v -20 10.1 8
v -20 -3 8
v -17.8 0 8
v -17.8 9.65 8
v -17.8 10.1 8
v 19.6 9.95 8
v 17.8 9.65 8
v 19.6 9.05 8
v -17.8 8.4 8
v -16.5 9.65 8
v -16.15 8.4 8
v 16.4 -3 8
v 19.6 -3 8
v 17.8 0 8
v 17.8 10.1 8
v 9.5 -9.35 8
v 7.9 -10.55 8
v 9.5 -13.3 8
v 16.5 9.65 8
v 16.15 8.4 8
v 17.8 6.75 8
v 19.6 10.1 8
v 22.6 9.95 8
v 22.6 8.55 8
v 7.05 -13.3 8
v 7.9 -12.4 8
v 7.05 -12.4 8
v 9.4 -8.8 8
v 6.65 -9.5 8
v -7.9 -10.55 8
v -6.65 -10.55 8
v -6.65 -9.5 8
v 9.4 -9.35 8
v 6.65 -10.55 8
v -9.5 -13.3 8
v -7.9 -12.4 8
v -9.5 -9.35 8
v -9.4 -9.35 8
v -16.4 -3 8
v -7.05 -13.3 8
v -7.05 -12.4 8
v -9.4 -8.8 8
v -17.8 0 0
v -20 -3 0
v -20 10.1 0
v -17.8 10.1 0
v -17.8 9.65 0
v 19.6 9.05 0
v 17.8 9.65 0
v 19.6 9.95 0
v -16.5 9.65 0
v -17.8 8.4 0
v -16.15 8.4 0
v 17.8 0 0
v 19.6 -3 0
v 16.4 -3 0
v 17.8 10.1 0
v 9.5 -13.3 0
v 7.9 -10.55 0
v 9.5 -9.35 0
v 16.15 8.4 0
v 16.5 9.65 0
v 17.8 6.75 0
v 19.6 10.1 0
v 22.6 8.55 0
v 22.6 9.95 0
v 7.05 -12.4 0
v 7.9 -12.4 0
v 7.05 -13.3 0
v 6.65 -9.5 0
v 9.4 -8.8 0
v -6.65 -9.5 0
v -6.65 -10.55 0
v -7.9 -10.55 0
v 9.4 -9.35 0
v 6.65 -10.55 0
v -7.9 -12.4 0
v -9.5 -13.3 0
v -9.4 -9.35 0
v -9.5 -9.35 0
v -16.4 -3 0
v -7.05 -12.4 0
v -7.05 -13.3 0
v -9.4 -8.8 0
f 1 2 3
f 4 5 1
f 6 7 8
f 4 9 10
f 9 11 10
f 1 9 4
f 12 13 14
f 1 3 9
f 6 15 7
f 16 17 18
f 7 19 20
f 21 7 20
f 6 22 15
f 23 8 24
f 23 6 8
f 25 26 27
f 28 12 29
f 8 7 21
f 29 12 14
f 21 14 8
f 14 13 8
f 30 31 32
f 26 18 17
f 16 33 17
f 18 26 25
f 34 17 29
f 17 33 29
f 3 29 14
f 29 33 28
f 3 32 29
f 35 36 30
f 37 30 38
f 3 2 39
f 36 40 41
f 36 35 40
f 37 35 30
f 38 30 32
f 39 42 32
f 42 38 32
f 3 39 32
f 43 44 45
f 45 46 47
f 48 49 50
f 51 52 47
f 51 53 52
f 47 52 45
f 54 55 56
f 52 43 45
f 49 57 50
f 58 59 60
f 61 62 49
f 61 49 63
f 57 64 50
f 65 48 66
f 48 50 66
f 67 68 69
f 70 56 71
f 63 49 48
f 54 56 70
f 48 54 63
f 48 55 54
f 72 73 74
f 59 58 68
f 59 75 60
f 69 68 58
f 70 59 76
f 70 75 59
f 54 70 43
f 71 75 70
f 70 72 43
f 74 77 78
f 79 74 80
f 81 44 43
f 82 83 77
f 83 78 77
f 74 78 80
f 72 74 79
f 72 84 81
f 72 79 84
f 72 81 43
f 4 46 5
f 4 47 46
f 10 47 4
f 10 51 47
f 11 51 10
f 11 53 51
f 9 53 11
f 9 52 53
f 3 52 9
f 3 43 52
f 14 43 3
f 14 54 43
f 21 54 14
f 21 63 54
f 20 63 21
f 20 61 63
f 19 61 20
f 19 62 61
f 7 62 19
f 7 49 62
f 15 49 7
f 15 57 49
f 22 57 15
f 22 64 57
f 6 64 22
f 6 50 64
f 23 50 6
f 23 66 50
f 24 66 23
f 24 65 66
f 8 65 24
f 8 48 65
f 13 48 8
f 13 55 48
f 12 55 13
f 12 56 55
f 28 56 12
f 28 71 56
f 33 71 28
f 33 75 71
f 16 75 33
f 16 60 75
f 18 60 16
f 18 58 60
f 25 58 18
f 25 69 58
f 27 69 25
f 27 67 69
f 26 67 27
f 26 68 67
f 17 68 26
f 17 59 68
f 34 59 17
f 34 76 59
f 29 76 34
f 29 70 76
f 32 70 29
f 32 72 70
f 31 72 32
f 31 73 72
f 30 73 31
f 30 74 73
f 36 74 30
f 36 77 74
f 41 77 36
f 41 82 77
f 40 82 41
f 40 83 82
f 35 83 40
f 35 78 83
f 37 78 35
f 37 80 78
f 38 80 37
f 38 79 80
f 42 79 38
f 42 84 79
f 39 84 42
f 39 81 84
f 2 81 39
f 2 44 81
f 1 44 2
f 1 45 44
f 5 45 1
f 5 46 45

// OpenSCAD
// ChatGPT HiLetgo 4-channel BSS138 level-shifter DIN rail mount
// Design version: 3
// VERSIONING RULE: Increment design_version by 1 for every repository check-in of this file.
//
// Design intent for v3:
//   * One-piece, side-profile DIN clip inspired by common printable PCB DIN mounts.
//   * Fixed DIN hook on one side + flexible snap hook on the other.
//   * PCB slides into two edge channels; no screws and no enclosure around the board.
//   * The model is a nearly constant cross-section, so it prints flat on its side with no supports.
//
// Standard rail: 35 mm x 7.5 mm top-hat DIN rail (EN 60715 / TH35-7.5).
// PCB envelope supplied by customer Q&A: approximately 15.3 x 12.6 x 1.6 mm.
// The 15.3 mm dimension is oriented ACROSS the DIN rail so the clips grip the two
// short, unpopulated PCB edges. The two 6-pin solder/header rows remain exposed.

$fn = 48;

// ---------- VERSION ----------
design_version = 3;  // Increment by 1 on every repository check-in

// ---------- OUTPUT / DEBUG ----------
// true = exported STL is already laid on its broad side for support-free printing.
// false = show the mount in its installed orientation.
print_orientation = true;
show_reference_pcb = false;  // useful only with print_orientation = false
show_reference_din = false;  // useful only with print_orientation = false

// ---------- PCB PARAMETERS ----------
pcb_x = 15.3;           // across DIN rail; clips grip the two short PCB edges
pcb_y = 12.6;           // along DIN rail; pin rows are near these two edges
pcb_t = 1.6;
pcb_side_clearance = 0.25;  // per side in the slide channel
pcb_z_clearance = 0.25;     // above PCB in the slide channel

// The mount only grips the center portion of the PCB so the pin rows/solder joints
// at both long edges remain unobstructed.
mount_depth = 8.0;      // along DIN rail

// PCB slide-channel geometry
channel_wall_t = 1.6;
lower_lip_overlap = 1.25;
lower_lip_t = 1.20;
upper_lip_overlap = 0.85;
upper_lip_t = 0.90;
under_pcb_gap = 1.35;   // clearance under the PCB center

// ---------- DIN RAIL PARAMETERS ----------
din_width = 35.0;
din_height = 7.5;
din_thickness = 1.0;       // common steel TH35 rail thickness
rail_side_clearance = 0.30;

// DIN clip geometry
backplate_t = 3.0;
fixed_hook_t = 2.2;
spring_arm_t = 1.8;
hook_overlap = 1.65;
hook_t = 1.25;
hook_extra_drop = 0.45;

// ---------- BODY PARAMETERS ----------
// The body narrows toward the tiny PCB, but stays a simple 2D profile.
body_shoulder_half_w = 16.4;
body_neck_half_w = 9.4;
body_neck_z = 8.8;

// ---------- DERIVED DIMENSIONS ----------
rail_half = din_width/2;
rail_flange_top_z = -din_height;
rail_flange_bottom_z = rail_flange_top_z - din_thickness;

fixed_inner_x = -(rail_half + rail_side_clearance);
fixed_outer_x = fixed_inner_x - fixed_hook_t;
spring_inner_x = rail_half + rail_side_clearance;
spring_outer_x = spring_inner_x + spring_arm_t;

hook_top_z = rail_flange_bottom_z + 0.10;
hook_bottom_z = hook_top_z - hook_t;
arm_bottom_z = hook_bottom_z - hook_extra_drop;

pcb_half = pcb_x/2;
channel_inner_x = pcb_half + pcb_side_clearance;
channel_outer_x = channel_inner_x + channel_wall_t;

channel_base_z = body_neck_z + 0.55;
pcb_bottom_z = channel_base_z + lower_lip_t;
pcb_top_z = pcb_bottom_z + pcb_t;
upper_lip_bottom_z = pcb_top_z + pcb_z_clearance;
channel_top_z = upper_lip_bottom_z + upper_lip_t;

// ---------- 2D HELPERS ----------
module rect2d(x0, x1, z0, z1) {
    translate([x0, z0]) square([x1-x0, z1-z0], center=false);
}

module body_profile_2d() {
    // Rail contact/backplate.
    rect2d(fixed_outer_x, spring_outer_x, 0, backplate_t);

    // Tapered body up to the PCB holder. Since the complete part is printed on
    // its side, these slopes do not create unsupported print overhangs.
    polygon(points=[
        [-body_shoulder_half_w, backplate_t],
        [ body_shoulder_half_w, backplate_t],
        [ body_neck_half_w, body_neck_z],
        [-body_neck_half_w, body_neck_z]
    ]);

    // Short neck connecting the tapered body to the PCB channels.
    rect2d(-body_neck_half_w, body_neck_half_w,
           body_neck_z, channel_base_z + 0.15);
}

module fixed_din_hook_2d() {
    // Rigid left wall.
    rect2d(fixed_outer_x, fixed_inner_x, arm_bottom_z, backplate_t);

    // Inward catch under the left DIN flange. The chamfer at the tip makes it
    // easier to engage the fixed side before snapping the spring side down.
    polygon(points=[
        [fixed_inner_x, hook_top_z],
        [fixed_inner_x + hook_overlap, hook_top_z],
        [fixed_inner_x + hook_overlap - 0.35, hook_bottom_z],
        [fixed_inner_x, hook_bottom_z]
    ]);
}

module spring_din_hook_2d() {
    // Long, simple spring arm attached only at the backplate. This is the part
    // that flexes outward while the mount is pushed onto the rail.
    rect2d(spring_inner_x, spring_outer_x, arm_bottom_z, backplate_t);

    // Snap hook with a generous diagonal lead-in. The rail flange rides along
    // the diagonal, pushes the arm outward, then the hook snaps underneath.
    polygon(points=[
        [spring_inner_x, hook_top_z + 1.65],
        [spring_inner_x, hook_bottom_z],
        [spring_inner_x - hook_overlap + 0.35, hook_bottom_z],
        [spring_inner_x - hook_overlap, hook_top_z],
        [spring_inner_x, hook_top_z + 1.65]
    ]);

    // Small outward pry tab at the bottom for a flat screwdriver during removal.
    polygon(points=[
        [spring_outer_x, arm_bottom_z + 0.15],
        [spring_outer_x + 3.0, arm_bottom_z + 0.15],
        [spring_outer_x + 3.0, arm_bottom_z + 1.55],
        [spring_outer_x, arm_bottom_z + 1.05]
    ]);
}

module pcb_channels_2d() {
    // Left and right channels are mirror images. The PCB slides in from either
    // end along Y; there are no snap tabs to fight and no hardware required.
    for (sx=[-1,1]) {
        // Vertical outside wall.
        x0 = sx < 0 ? -channel_outer_x : channel_inner_x;
        x1 = sx < 0 ? -channel_inner_x : channel_outer_x;
        rect2d(x0, x1, channel_base_z, channel_top_z);

        // Lower support ledge: only the outer edge of the PCB is supported,
        // leaving the board center and bottom-side soldering clear.
        lx0 = sx < 0 ? -channel_inner_x : channel_inner_x - lower_lip_overlap;
        lx1 = sx < 0 ? -channel_inner_x + lower_lip_overlap : channel_inner_x;
        rect2d(lx0, lx1, channel_base_z, pcb_bottom_z);

        // Upper retaining lip.
        ux0 = sx < 0 ? -channel_inner_x : channel_inner_x - upper_lip_overlap;
        ux1 = sx < 0 ? -channel_inner_x + upper_lip_overlap : channel_inner_x;
        rect2d(ux0, ux1, upper_lip_bottom_z, channel_top_z);
    }

    // Two tiny feet connect the edge channels to the neck while preserving most
    // of the under-PCB air gap.
    foot_w = 2.2;
    for (sx=[-1,1]) {
        cx = sx * (channel_inner_x - lower_lip_overlap/2);
        rect2d(cx-foot_w/2, cx+foot_w/2,
               body_neck_z, channel_base_z + 0.10);
    }
}

module mount_profile_2d() {
    union() {
        body_profile_2d();
        fixed_din_hook_2d();
        spring_din_hook_2d();
        pcb_channels_2d();
    }
}

module mount_installed_orientation() {
    // Extruding a single side profile is the key to the easy-print design.
    rotate([90,0,0])
        linear_extrude(height=mount_depth, center=true, convexity=10)
            mount_profile_2d();
}

module reference_pcb() {
    color([0.05,0.35,0.65,0.45])
        translate([0,0,pcb_bottom_z + pcb_t/2])
            cube([pcb_x, pcb_y, pcb_t], center=true);
}

module reference_din() {
    // Simplified TH35-7.5 reference rail for fit visualization only.
    // 35 mm overall width, 27 mm crown width, 7.5 mm height, 1 mm material.
    crown_half = 13.5;
    rail_len = mount_depth + 12;
    color([0.55,0.55,0.55,0.35])
    rotate([90,0,0])
        linear_extrude(height=rail_len, center=true)
            polygon(points=[
                [-crown_half, 0], [ crown_half, 0],
                [ rail_half, rail_flange_top_z],
                [ rail_half, rail_flange_bottom_z],
                [ crown_half-0.8, rail_flange_top_z+0.15],
                [-crown_half+0.8, rail_flange_top_z+0.15],
                [-rail_half, rail_flange_bottom_z],
                [-rail_half, rail_flange_top_z]
            ]);
}

module final_model() {
    if (print_orientation) {
        // Put one broad X-Z side directly on the print bed. The spring flexes in
        // the layer plane, which is both strong and support-free.
        translate([0,0,mount_depth/2])
            rotate([90,0,0])
                mount_installed_orientation();
    } else {
        mount_installed_orientation();
        if (show_reference_pcb) reference_pcb();
        if (show_reference_din) reference_din();
    }
}

final_model();
